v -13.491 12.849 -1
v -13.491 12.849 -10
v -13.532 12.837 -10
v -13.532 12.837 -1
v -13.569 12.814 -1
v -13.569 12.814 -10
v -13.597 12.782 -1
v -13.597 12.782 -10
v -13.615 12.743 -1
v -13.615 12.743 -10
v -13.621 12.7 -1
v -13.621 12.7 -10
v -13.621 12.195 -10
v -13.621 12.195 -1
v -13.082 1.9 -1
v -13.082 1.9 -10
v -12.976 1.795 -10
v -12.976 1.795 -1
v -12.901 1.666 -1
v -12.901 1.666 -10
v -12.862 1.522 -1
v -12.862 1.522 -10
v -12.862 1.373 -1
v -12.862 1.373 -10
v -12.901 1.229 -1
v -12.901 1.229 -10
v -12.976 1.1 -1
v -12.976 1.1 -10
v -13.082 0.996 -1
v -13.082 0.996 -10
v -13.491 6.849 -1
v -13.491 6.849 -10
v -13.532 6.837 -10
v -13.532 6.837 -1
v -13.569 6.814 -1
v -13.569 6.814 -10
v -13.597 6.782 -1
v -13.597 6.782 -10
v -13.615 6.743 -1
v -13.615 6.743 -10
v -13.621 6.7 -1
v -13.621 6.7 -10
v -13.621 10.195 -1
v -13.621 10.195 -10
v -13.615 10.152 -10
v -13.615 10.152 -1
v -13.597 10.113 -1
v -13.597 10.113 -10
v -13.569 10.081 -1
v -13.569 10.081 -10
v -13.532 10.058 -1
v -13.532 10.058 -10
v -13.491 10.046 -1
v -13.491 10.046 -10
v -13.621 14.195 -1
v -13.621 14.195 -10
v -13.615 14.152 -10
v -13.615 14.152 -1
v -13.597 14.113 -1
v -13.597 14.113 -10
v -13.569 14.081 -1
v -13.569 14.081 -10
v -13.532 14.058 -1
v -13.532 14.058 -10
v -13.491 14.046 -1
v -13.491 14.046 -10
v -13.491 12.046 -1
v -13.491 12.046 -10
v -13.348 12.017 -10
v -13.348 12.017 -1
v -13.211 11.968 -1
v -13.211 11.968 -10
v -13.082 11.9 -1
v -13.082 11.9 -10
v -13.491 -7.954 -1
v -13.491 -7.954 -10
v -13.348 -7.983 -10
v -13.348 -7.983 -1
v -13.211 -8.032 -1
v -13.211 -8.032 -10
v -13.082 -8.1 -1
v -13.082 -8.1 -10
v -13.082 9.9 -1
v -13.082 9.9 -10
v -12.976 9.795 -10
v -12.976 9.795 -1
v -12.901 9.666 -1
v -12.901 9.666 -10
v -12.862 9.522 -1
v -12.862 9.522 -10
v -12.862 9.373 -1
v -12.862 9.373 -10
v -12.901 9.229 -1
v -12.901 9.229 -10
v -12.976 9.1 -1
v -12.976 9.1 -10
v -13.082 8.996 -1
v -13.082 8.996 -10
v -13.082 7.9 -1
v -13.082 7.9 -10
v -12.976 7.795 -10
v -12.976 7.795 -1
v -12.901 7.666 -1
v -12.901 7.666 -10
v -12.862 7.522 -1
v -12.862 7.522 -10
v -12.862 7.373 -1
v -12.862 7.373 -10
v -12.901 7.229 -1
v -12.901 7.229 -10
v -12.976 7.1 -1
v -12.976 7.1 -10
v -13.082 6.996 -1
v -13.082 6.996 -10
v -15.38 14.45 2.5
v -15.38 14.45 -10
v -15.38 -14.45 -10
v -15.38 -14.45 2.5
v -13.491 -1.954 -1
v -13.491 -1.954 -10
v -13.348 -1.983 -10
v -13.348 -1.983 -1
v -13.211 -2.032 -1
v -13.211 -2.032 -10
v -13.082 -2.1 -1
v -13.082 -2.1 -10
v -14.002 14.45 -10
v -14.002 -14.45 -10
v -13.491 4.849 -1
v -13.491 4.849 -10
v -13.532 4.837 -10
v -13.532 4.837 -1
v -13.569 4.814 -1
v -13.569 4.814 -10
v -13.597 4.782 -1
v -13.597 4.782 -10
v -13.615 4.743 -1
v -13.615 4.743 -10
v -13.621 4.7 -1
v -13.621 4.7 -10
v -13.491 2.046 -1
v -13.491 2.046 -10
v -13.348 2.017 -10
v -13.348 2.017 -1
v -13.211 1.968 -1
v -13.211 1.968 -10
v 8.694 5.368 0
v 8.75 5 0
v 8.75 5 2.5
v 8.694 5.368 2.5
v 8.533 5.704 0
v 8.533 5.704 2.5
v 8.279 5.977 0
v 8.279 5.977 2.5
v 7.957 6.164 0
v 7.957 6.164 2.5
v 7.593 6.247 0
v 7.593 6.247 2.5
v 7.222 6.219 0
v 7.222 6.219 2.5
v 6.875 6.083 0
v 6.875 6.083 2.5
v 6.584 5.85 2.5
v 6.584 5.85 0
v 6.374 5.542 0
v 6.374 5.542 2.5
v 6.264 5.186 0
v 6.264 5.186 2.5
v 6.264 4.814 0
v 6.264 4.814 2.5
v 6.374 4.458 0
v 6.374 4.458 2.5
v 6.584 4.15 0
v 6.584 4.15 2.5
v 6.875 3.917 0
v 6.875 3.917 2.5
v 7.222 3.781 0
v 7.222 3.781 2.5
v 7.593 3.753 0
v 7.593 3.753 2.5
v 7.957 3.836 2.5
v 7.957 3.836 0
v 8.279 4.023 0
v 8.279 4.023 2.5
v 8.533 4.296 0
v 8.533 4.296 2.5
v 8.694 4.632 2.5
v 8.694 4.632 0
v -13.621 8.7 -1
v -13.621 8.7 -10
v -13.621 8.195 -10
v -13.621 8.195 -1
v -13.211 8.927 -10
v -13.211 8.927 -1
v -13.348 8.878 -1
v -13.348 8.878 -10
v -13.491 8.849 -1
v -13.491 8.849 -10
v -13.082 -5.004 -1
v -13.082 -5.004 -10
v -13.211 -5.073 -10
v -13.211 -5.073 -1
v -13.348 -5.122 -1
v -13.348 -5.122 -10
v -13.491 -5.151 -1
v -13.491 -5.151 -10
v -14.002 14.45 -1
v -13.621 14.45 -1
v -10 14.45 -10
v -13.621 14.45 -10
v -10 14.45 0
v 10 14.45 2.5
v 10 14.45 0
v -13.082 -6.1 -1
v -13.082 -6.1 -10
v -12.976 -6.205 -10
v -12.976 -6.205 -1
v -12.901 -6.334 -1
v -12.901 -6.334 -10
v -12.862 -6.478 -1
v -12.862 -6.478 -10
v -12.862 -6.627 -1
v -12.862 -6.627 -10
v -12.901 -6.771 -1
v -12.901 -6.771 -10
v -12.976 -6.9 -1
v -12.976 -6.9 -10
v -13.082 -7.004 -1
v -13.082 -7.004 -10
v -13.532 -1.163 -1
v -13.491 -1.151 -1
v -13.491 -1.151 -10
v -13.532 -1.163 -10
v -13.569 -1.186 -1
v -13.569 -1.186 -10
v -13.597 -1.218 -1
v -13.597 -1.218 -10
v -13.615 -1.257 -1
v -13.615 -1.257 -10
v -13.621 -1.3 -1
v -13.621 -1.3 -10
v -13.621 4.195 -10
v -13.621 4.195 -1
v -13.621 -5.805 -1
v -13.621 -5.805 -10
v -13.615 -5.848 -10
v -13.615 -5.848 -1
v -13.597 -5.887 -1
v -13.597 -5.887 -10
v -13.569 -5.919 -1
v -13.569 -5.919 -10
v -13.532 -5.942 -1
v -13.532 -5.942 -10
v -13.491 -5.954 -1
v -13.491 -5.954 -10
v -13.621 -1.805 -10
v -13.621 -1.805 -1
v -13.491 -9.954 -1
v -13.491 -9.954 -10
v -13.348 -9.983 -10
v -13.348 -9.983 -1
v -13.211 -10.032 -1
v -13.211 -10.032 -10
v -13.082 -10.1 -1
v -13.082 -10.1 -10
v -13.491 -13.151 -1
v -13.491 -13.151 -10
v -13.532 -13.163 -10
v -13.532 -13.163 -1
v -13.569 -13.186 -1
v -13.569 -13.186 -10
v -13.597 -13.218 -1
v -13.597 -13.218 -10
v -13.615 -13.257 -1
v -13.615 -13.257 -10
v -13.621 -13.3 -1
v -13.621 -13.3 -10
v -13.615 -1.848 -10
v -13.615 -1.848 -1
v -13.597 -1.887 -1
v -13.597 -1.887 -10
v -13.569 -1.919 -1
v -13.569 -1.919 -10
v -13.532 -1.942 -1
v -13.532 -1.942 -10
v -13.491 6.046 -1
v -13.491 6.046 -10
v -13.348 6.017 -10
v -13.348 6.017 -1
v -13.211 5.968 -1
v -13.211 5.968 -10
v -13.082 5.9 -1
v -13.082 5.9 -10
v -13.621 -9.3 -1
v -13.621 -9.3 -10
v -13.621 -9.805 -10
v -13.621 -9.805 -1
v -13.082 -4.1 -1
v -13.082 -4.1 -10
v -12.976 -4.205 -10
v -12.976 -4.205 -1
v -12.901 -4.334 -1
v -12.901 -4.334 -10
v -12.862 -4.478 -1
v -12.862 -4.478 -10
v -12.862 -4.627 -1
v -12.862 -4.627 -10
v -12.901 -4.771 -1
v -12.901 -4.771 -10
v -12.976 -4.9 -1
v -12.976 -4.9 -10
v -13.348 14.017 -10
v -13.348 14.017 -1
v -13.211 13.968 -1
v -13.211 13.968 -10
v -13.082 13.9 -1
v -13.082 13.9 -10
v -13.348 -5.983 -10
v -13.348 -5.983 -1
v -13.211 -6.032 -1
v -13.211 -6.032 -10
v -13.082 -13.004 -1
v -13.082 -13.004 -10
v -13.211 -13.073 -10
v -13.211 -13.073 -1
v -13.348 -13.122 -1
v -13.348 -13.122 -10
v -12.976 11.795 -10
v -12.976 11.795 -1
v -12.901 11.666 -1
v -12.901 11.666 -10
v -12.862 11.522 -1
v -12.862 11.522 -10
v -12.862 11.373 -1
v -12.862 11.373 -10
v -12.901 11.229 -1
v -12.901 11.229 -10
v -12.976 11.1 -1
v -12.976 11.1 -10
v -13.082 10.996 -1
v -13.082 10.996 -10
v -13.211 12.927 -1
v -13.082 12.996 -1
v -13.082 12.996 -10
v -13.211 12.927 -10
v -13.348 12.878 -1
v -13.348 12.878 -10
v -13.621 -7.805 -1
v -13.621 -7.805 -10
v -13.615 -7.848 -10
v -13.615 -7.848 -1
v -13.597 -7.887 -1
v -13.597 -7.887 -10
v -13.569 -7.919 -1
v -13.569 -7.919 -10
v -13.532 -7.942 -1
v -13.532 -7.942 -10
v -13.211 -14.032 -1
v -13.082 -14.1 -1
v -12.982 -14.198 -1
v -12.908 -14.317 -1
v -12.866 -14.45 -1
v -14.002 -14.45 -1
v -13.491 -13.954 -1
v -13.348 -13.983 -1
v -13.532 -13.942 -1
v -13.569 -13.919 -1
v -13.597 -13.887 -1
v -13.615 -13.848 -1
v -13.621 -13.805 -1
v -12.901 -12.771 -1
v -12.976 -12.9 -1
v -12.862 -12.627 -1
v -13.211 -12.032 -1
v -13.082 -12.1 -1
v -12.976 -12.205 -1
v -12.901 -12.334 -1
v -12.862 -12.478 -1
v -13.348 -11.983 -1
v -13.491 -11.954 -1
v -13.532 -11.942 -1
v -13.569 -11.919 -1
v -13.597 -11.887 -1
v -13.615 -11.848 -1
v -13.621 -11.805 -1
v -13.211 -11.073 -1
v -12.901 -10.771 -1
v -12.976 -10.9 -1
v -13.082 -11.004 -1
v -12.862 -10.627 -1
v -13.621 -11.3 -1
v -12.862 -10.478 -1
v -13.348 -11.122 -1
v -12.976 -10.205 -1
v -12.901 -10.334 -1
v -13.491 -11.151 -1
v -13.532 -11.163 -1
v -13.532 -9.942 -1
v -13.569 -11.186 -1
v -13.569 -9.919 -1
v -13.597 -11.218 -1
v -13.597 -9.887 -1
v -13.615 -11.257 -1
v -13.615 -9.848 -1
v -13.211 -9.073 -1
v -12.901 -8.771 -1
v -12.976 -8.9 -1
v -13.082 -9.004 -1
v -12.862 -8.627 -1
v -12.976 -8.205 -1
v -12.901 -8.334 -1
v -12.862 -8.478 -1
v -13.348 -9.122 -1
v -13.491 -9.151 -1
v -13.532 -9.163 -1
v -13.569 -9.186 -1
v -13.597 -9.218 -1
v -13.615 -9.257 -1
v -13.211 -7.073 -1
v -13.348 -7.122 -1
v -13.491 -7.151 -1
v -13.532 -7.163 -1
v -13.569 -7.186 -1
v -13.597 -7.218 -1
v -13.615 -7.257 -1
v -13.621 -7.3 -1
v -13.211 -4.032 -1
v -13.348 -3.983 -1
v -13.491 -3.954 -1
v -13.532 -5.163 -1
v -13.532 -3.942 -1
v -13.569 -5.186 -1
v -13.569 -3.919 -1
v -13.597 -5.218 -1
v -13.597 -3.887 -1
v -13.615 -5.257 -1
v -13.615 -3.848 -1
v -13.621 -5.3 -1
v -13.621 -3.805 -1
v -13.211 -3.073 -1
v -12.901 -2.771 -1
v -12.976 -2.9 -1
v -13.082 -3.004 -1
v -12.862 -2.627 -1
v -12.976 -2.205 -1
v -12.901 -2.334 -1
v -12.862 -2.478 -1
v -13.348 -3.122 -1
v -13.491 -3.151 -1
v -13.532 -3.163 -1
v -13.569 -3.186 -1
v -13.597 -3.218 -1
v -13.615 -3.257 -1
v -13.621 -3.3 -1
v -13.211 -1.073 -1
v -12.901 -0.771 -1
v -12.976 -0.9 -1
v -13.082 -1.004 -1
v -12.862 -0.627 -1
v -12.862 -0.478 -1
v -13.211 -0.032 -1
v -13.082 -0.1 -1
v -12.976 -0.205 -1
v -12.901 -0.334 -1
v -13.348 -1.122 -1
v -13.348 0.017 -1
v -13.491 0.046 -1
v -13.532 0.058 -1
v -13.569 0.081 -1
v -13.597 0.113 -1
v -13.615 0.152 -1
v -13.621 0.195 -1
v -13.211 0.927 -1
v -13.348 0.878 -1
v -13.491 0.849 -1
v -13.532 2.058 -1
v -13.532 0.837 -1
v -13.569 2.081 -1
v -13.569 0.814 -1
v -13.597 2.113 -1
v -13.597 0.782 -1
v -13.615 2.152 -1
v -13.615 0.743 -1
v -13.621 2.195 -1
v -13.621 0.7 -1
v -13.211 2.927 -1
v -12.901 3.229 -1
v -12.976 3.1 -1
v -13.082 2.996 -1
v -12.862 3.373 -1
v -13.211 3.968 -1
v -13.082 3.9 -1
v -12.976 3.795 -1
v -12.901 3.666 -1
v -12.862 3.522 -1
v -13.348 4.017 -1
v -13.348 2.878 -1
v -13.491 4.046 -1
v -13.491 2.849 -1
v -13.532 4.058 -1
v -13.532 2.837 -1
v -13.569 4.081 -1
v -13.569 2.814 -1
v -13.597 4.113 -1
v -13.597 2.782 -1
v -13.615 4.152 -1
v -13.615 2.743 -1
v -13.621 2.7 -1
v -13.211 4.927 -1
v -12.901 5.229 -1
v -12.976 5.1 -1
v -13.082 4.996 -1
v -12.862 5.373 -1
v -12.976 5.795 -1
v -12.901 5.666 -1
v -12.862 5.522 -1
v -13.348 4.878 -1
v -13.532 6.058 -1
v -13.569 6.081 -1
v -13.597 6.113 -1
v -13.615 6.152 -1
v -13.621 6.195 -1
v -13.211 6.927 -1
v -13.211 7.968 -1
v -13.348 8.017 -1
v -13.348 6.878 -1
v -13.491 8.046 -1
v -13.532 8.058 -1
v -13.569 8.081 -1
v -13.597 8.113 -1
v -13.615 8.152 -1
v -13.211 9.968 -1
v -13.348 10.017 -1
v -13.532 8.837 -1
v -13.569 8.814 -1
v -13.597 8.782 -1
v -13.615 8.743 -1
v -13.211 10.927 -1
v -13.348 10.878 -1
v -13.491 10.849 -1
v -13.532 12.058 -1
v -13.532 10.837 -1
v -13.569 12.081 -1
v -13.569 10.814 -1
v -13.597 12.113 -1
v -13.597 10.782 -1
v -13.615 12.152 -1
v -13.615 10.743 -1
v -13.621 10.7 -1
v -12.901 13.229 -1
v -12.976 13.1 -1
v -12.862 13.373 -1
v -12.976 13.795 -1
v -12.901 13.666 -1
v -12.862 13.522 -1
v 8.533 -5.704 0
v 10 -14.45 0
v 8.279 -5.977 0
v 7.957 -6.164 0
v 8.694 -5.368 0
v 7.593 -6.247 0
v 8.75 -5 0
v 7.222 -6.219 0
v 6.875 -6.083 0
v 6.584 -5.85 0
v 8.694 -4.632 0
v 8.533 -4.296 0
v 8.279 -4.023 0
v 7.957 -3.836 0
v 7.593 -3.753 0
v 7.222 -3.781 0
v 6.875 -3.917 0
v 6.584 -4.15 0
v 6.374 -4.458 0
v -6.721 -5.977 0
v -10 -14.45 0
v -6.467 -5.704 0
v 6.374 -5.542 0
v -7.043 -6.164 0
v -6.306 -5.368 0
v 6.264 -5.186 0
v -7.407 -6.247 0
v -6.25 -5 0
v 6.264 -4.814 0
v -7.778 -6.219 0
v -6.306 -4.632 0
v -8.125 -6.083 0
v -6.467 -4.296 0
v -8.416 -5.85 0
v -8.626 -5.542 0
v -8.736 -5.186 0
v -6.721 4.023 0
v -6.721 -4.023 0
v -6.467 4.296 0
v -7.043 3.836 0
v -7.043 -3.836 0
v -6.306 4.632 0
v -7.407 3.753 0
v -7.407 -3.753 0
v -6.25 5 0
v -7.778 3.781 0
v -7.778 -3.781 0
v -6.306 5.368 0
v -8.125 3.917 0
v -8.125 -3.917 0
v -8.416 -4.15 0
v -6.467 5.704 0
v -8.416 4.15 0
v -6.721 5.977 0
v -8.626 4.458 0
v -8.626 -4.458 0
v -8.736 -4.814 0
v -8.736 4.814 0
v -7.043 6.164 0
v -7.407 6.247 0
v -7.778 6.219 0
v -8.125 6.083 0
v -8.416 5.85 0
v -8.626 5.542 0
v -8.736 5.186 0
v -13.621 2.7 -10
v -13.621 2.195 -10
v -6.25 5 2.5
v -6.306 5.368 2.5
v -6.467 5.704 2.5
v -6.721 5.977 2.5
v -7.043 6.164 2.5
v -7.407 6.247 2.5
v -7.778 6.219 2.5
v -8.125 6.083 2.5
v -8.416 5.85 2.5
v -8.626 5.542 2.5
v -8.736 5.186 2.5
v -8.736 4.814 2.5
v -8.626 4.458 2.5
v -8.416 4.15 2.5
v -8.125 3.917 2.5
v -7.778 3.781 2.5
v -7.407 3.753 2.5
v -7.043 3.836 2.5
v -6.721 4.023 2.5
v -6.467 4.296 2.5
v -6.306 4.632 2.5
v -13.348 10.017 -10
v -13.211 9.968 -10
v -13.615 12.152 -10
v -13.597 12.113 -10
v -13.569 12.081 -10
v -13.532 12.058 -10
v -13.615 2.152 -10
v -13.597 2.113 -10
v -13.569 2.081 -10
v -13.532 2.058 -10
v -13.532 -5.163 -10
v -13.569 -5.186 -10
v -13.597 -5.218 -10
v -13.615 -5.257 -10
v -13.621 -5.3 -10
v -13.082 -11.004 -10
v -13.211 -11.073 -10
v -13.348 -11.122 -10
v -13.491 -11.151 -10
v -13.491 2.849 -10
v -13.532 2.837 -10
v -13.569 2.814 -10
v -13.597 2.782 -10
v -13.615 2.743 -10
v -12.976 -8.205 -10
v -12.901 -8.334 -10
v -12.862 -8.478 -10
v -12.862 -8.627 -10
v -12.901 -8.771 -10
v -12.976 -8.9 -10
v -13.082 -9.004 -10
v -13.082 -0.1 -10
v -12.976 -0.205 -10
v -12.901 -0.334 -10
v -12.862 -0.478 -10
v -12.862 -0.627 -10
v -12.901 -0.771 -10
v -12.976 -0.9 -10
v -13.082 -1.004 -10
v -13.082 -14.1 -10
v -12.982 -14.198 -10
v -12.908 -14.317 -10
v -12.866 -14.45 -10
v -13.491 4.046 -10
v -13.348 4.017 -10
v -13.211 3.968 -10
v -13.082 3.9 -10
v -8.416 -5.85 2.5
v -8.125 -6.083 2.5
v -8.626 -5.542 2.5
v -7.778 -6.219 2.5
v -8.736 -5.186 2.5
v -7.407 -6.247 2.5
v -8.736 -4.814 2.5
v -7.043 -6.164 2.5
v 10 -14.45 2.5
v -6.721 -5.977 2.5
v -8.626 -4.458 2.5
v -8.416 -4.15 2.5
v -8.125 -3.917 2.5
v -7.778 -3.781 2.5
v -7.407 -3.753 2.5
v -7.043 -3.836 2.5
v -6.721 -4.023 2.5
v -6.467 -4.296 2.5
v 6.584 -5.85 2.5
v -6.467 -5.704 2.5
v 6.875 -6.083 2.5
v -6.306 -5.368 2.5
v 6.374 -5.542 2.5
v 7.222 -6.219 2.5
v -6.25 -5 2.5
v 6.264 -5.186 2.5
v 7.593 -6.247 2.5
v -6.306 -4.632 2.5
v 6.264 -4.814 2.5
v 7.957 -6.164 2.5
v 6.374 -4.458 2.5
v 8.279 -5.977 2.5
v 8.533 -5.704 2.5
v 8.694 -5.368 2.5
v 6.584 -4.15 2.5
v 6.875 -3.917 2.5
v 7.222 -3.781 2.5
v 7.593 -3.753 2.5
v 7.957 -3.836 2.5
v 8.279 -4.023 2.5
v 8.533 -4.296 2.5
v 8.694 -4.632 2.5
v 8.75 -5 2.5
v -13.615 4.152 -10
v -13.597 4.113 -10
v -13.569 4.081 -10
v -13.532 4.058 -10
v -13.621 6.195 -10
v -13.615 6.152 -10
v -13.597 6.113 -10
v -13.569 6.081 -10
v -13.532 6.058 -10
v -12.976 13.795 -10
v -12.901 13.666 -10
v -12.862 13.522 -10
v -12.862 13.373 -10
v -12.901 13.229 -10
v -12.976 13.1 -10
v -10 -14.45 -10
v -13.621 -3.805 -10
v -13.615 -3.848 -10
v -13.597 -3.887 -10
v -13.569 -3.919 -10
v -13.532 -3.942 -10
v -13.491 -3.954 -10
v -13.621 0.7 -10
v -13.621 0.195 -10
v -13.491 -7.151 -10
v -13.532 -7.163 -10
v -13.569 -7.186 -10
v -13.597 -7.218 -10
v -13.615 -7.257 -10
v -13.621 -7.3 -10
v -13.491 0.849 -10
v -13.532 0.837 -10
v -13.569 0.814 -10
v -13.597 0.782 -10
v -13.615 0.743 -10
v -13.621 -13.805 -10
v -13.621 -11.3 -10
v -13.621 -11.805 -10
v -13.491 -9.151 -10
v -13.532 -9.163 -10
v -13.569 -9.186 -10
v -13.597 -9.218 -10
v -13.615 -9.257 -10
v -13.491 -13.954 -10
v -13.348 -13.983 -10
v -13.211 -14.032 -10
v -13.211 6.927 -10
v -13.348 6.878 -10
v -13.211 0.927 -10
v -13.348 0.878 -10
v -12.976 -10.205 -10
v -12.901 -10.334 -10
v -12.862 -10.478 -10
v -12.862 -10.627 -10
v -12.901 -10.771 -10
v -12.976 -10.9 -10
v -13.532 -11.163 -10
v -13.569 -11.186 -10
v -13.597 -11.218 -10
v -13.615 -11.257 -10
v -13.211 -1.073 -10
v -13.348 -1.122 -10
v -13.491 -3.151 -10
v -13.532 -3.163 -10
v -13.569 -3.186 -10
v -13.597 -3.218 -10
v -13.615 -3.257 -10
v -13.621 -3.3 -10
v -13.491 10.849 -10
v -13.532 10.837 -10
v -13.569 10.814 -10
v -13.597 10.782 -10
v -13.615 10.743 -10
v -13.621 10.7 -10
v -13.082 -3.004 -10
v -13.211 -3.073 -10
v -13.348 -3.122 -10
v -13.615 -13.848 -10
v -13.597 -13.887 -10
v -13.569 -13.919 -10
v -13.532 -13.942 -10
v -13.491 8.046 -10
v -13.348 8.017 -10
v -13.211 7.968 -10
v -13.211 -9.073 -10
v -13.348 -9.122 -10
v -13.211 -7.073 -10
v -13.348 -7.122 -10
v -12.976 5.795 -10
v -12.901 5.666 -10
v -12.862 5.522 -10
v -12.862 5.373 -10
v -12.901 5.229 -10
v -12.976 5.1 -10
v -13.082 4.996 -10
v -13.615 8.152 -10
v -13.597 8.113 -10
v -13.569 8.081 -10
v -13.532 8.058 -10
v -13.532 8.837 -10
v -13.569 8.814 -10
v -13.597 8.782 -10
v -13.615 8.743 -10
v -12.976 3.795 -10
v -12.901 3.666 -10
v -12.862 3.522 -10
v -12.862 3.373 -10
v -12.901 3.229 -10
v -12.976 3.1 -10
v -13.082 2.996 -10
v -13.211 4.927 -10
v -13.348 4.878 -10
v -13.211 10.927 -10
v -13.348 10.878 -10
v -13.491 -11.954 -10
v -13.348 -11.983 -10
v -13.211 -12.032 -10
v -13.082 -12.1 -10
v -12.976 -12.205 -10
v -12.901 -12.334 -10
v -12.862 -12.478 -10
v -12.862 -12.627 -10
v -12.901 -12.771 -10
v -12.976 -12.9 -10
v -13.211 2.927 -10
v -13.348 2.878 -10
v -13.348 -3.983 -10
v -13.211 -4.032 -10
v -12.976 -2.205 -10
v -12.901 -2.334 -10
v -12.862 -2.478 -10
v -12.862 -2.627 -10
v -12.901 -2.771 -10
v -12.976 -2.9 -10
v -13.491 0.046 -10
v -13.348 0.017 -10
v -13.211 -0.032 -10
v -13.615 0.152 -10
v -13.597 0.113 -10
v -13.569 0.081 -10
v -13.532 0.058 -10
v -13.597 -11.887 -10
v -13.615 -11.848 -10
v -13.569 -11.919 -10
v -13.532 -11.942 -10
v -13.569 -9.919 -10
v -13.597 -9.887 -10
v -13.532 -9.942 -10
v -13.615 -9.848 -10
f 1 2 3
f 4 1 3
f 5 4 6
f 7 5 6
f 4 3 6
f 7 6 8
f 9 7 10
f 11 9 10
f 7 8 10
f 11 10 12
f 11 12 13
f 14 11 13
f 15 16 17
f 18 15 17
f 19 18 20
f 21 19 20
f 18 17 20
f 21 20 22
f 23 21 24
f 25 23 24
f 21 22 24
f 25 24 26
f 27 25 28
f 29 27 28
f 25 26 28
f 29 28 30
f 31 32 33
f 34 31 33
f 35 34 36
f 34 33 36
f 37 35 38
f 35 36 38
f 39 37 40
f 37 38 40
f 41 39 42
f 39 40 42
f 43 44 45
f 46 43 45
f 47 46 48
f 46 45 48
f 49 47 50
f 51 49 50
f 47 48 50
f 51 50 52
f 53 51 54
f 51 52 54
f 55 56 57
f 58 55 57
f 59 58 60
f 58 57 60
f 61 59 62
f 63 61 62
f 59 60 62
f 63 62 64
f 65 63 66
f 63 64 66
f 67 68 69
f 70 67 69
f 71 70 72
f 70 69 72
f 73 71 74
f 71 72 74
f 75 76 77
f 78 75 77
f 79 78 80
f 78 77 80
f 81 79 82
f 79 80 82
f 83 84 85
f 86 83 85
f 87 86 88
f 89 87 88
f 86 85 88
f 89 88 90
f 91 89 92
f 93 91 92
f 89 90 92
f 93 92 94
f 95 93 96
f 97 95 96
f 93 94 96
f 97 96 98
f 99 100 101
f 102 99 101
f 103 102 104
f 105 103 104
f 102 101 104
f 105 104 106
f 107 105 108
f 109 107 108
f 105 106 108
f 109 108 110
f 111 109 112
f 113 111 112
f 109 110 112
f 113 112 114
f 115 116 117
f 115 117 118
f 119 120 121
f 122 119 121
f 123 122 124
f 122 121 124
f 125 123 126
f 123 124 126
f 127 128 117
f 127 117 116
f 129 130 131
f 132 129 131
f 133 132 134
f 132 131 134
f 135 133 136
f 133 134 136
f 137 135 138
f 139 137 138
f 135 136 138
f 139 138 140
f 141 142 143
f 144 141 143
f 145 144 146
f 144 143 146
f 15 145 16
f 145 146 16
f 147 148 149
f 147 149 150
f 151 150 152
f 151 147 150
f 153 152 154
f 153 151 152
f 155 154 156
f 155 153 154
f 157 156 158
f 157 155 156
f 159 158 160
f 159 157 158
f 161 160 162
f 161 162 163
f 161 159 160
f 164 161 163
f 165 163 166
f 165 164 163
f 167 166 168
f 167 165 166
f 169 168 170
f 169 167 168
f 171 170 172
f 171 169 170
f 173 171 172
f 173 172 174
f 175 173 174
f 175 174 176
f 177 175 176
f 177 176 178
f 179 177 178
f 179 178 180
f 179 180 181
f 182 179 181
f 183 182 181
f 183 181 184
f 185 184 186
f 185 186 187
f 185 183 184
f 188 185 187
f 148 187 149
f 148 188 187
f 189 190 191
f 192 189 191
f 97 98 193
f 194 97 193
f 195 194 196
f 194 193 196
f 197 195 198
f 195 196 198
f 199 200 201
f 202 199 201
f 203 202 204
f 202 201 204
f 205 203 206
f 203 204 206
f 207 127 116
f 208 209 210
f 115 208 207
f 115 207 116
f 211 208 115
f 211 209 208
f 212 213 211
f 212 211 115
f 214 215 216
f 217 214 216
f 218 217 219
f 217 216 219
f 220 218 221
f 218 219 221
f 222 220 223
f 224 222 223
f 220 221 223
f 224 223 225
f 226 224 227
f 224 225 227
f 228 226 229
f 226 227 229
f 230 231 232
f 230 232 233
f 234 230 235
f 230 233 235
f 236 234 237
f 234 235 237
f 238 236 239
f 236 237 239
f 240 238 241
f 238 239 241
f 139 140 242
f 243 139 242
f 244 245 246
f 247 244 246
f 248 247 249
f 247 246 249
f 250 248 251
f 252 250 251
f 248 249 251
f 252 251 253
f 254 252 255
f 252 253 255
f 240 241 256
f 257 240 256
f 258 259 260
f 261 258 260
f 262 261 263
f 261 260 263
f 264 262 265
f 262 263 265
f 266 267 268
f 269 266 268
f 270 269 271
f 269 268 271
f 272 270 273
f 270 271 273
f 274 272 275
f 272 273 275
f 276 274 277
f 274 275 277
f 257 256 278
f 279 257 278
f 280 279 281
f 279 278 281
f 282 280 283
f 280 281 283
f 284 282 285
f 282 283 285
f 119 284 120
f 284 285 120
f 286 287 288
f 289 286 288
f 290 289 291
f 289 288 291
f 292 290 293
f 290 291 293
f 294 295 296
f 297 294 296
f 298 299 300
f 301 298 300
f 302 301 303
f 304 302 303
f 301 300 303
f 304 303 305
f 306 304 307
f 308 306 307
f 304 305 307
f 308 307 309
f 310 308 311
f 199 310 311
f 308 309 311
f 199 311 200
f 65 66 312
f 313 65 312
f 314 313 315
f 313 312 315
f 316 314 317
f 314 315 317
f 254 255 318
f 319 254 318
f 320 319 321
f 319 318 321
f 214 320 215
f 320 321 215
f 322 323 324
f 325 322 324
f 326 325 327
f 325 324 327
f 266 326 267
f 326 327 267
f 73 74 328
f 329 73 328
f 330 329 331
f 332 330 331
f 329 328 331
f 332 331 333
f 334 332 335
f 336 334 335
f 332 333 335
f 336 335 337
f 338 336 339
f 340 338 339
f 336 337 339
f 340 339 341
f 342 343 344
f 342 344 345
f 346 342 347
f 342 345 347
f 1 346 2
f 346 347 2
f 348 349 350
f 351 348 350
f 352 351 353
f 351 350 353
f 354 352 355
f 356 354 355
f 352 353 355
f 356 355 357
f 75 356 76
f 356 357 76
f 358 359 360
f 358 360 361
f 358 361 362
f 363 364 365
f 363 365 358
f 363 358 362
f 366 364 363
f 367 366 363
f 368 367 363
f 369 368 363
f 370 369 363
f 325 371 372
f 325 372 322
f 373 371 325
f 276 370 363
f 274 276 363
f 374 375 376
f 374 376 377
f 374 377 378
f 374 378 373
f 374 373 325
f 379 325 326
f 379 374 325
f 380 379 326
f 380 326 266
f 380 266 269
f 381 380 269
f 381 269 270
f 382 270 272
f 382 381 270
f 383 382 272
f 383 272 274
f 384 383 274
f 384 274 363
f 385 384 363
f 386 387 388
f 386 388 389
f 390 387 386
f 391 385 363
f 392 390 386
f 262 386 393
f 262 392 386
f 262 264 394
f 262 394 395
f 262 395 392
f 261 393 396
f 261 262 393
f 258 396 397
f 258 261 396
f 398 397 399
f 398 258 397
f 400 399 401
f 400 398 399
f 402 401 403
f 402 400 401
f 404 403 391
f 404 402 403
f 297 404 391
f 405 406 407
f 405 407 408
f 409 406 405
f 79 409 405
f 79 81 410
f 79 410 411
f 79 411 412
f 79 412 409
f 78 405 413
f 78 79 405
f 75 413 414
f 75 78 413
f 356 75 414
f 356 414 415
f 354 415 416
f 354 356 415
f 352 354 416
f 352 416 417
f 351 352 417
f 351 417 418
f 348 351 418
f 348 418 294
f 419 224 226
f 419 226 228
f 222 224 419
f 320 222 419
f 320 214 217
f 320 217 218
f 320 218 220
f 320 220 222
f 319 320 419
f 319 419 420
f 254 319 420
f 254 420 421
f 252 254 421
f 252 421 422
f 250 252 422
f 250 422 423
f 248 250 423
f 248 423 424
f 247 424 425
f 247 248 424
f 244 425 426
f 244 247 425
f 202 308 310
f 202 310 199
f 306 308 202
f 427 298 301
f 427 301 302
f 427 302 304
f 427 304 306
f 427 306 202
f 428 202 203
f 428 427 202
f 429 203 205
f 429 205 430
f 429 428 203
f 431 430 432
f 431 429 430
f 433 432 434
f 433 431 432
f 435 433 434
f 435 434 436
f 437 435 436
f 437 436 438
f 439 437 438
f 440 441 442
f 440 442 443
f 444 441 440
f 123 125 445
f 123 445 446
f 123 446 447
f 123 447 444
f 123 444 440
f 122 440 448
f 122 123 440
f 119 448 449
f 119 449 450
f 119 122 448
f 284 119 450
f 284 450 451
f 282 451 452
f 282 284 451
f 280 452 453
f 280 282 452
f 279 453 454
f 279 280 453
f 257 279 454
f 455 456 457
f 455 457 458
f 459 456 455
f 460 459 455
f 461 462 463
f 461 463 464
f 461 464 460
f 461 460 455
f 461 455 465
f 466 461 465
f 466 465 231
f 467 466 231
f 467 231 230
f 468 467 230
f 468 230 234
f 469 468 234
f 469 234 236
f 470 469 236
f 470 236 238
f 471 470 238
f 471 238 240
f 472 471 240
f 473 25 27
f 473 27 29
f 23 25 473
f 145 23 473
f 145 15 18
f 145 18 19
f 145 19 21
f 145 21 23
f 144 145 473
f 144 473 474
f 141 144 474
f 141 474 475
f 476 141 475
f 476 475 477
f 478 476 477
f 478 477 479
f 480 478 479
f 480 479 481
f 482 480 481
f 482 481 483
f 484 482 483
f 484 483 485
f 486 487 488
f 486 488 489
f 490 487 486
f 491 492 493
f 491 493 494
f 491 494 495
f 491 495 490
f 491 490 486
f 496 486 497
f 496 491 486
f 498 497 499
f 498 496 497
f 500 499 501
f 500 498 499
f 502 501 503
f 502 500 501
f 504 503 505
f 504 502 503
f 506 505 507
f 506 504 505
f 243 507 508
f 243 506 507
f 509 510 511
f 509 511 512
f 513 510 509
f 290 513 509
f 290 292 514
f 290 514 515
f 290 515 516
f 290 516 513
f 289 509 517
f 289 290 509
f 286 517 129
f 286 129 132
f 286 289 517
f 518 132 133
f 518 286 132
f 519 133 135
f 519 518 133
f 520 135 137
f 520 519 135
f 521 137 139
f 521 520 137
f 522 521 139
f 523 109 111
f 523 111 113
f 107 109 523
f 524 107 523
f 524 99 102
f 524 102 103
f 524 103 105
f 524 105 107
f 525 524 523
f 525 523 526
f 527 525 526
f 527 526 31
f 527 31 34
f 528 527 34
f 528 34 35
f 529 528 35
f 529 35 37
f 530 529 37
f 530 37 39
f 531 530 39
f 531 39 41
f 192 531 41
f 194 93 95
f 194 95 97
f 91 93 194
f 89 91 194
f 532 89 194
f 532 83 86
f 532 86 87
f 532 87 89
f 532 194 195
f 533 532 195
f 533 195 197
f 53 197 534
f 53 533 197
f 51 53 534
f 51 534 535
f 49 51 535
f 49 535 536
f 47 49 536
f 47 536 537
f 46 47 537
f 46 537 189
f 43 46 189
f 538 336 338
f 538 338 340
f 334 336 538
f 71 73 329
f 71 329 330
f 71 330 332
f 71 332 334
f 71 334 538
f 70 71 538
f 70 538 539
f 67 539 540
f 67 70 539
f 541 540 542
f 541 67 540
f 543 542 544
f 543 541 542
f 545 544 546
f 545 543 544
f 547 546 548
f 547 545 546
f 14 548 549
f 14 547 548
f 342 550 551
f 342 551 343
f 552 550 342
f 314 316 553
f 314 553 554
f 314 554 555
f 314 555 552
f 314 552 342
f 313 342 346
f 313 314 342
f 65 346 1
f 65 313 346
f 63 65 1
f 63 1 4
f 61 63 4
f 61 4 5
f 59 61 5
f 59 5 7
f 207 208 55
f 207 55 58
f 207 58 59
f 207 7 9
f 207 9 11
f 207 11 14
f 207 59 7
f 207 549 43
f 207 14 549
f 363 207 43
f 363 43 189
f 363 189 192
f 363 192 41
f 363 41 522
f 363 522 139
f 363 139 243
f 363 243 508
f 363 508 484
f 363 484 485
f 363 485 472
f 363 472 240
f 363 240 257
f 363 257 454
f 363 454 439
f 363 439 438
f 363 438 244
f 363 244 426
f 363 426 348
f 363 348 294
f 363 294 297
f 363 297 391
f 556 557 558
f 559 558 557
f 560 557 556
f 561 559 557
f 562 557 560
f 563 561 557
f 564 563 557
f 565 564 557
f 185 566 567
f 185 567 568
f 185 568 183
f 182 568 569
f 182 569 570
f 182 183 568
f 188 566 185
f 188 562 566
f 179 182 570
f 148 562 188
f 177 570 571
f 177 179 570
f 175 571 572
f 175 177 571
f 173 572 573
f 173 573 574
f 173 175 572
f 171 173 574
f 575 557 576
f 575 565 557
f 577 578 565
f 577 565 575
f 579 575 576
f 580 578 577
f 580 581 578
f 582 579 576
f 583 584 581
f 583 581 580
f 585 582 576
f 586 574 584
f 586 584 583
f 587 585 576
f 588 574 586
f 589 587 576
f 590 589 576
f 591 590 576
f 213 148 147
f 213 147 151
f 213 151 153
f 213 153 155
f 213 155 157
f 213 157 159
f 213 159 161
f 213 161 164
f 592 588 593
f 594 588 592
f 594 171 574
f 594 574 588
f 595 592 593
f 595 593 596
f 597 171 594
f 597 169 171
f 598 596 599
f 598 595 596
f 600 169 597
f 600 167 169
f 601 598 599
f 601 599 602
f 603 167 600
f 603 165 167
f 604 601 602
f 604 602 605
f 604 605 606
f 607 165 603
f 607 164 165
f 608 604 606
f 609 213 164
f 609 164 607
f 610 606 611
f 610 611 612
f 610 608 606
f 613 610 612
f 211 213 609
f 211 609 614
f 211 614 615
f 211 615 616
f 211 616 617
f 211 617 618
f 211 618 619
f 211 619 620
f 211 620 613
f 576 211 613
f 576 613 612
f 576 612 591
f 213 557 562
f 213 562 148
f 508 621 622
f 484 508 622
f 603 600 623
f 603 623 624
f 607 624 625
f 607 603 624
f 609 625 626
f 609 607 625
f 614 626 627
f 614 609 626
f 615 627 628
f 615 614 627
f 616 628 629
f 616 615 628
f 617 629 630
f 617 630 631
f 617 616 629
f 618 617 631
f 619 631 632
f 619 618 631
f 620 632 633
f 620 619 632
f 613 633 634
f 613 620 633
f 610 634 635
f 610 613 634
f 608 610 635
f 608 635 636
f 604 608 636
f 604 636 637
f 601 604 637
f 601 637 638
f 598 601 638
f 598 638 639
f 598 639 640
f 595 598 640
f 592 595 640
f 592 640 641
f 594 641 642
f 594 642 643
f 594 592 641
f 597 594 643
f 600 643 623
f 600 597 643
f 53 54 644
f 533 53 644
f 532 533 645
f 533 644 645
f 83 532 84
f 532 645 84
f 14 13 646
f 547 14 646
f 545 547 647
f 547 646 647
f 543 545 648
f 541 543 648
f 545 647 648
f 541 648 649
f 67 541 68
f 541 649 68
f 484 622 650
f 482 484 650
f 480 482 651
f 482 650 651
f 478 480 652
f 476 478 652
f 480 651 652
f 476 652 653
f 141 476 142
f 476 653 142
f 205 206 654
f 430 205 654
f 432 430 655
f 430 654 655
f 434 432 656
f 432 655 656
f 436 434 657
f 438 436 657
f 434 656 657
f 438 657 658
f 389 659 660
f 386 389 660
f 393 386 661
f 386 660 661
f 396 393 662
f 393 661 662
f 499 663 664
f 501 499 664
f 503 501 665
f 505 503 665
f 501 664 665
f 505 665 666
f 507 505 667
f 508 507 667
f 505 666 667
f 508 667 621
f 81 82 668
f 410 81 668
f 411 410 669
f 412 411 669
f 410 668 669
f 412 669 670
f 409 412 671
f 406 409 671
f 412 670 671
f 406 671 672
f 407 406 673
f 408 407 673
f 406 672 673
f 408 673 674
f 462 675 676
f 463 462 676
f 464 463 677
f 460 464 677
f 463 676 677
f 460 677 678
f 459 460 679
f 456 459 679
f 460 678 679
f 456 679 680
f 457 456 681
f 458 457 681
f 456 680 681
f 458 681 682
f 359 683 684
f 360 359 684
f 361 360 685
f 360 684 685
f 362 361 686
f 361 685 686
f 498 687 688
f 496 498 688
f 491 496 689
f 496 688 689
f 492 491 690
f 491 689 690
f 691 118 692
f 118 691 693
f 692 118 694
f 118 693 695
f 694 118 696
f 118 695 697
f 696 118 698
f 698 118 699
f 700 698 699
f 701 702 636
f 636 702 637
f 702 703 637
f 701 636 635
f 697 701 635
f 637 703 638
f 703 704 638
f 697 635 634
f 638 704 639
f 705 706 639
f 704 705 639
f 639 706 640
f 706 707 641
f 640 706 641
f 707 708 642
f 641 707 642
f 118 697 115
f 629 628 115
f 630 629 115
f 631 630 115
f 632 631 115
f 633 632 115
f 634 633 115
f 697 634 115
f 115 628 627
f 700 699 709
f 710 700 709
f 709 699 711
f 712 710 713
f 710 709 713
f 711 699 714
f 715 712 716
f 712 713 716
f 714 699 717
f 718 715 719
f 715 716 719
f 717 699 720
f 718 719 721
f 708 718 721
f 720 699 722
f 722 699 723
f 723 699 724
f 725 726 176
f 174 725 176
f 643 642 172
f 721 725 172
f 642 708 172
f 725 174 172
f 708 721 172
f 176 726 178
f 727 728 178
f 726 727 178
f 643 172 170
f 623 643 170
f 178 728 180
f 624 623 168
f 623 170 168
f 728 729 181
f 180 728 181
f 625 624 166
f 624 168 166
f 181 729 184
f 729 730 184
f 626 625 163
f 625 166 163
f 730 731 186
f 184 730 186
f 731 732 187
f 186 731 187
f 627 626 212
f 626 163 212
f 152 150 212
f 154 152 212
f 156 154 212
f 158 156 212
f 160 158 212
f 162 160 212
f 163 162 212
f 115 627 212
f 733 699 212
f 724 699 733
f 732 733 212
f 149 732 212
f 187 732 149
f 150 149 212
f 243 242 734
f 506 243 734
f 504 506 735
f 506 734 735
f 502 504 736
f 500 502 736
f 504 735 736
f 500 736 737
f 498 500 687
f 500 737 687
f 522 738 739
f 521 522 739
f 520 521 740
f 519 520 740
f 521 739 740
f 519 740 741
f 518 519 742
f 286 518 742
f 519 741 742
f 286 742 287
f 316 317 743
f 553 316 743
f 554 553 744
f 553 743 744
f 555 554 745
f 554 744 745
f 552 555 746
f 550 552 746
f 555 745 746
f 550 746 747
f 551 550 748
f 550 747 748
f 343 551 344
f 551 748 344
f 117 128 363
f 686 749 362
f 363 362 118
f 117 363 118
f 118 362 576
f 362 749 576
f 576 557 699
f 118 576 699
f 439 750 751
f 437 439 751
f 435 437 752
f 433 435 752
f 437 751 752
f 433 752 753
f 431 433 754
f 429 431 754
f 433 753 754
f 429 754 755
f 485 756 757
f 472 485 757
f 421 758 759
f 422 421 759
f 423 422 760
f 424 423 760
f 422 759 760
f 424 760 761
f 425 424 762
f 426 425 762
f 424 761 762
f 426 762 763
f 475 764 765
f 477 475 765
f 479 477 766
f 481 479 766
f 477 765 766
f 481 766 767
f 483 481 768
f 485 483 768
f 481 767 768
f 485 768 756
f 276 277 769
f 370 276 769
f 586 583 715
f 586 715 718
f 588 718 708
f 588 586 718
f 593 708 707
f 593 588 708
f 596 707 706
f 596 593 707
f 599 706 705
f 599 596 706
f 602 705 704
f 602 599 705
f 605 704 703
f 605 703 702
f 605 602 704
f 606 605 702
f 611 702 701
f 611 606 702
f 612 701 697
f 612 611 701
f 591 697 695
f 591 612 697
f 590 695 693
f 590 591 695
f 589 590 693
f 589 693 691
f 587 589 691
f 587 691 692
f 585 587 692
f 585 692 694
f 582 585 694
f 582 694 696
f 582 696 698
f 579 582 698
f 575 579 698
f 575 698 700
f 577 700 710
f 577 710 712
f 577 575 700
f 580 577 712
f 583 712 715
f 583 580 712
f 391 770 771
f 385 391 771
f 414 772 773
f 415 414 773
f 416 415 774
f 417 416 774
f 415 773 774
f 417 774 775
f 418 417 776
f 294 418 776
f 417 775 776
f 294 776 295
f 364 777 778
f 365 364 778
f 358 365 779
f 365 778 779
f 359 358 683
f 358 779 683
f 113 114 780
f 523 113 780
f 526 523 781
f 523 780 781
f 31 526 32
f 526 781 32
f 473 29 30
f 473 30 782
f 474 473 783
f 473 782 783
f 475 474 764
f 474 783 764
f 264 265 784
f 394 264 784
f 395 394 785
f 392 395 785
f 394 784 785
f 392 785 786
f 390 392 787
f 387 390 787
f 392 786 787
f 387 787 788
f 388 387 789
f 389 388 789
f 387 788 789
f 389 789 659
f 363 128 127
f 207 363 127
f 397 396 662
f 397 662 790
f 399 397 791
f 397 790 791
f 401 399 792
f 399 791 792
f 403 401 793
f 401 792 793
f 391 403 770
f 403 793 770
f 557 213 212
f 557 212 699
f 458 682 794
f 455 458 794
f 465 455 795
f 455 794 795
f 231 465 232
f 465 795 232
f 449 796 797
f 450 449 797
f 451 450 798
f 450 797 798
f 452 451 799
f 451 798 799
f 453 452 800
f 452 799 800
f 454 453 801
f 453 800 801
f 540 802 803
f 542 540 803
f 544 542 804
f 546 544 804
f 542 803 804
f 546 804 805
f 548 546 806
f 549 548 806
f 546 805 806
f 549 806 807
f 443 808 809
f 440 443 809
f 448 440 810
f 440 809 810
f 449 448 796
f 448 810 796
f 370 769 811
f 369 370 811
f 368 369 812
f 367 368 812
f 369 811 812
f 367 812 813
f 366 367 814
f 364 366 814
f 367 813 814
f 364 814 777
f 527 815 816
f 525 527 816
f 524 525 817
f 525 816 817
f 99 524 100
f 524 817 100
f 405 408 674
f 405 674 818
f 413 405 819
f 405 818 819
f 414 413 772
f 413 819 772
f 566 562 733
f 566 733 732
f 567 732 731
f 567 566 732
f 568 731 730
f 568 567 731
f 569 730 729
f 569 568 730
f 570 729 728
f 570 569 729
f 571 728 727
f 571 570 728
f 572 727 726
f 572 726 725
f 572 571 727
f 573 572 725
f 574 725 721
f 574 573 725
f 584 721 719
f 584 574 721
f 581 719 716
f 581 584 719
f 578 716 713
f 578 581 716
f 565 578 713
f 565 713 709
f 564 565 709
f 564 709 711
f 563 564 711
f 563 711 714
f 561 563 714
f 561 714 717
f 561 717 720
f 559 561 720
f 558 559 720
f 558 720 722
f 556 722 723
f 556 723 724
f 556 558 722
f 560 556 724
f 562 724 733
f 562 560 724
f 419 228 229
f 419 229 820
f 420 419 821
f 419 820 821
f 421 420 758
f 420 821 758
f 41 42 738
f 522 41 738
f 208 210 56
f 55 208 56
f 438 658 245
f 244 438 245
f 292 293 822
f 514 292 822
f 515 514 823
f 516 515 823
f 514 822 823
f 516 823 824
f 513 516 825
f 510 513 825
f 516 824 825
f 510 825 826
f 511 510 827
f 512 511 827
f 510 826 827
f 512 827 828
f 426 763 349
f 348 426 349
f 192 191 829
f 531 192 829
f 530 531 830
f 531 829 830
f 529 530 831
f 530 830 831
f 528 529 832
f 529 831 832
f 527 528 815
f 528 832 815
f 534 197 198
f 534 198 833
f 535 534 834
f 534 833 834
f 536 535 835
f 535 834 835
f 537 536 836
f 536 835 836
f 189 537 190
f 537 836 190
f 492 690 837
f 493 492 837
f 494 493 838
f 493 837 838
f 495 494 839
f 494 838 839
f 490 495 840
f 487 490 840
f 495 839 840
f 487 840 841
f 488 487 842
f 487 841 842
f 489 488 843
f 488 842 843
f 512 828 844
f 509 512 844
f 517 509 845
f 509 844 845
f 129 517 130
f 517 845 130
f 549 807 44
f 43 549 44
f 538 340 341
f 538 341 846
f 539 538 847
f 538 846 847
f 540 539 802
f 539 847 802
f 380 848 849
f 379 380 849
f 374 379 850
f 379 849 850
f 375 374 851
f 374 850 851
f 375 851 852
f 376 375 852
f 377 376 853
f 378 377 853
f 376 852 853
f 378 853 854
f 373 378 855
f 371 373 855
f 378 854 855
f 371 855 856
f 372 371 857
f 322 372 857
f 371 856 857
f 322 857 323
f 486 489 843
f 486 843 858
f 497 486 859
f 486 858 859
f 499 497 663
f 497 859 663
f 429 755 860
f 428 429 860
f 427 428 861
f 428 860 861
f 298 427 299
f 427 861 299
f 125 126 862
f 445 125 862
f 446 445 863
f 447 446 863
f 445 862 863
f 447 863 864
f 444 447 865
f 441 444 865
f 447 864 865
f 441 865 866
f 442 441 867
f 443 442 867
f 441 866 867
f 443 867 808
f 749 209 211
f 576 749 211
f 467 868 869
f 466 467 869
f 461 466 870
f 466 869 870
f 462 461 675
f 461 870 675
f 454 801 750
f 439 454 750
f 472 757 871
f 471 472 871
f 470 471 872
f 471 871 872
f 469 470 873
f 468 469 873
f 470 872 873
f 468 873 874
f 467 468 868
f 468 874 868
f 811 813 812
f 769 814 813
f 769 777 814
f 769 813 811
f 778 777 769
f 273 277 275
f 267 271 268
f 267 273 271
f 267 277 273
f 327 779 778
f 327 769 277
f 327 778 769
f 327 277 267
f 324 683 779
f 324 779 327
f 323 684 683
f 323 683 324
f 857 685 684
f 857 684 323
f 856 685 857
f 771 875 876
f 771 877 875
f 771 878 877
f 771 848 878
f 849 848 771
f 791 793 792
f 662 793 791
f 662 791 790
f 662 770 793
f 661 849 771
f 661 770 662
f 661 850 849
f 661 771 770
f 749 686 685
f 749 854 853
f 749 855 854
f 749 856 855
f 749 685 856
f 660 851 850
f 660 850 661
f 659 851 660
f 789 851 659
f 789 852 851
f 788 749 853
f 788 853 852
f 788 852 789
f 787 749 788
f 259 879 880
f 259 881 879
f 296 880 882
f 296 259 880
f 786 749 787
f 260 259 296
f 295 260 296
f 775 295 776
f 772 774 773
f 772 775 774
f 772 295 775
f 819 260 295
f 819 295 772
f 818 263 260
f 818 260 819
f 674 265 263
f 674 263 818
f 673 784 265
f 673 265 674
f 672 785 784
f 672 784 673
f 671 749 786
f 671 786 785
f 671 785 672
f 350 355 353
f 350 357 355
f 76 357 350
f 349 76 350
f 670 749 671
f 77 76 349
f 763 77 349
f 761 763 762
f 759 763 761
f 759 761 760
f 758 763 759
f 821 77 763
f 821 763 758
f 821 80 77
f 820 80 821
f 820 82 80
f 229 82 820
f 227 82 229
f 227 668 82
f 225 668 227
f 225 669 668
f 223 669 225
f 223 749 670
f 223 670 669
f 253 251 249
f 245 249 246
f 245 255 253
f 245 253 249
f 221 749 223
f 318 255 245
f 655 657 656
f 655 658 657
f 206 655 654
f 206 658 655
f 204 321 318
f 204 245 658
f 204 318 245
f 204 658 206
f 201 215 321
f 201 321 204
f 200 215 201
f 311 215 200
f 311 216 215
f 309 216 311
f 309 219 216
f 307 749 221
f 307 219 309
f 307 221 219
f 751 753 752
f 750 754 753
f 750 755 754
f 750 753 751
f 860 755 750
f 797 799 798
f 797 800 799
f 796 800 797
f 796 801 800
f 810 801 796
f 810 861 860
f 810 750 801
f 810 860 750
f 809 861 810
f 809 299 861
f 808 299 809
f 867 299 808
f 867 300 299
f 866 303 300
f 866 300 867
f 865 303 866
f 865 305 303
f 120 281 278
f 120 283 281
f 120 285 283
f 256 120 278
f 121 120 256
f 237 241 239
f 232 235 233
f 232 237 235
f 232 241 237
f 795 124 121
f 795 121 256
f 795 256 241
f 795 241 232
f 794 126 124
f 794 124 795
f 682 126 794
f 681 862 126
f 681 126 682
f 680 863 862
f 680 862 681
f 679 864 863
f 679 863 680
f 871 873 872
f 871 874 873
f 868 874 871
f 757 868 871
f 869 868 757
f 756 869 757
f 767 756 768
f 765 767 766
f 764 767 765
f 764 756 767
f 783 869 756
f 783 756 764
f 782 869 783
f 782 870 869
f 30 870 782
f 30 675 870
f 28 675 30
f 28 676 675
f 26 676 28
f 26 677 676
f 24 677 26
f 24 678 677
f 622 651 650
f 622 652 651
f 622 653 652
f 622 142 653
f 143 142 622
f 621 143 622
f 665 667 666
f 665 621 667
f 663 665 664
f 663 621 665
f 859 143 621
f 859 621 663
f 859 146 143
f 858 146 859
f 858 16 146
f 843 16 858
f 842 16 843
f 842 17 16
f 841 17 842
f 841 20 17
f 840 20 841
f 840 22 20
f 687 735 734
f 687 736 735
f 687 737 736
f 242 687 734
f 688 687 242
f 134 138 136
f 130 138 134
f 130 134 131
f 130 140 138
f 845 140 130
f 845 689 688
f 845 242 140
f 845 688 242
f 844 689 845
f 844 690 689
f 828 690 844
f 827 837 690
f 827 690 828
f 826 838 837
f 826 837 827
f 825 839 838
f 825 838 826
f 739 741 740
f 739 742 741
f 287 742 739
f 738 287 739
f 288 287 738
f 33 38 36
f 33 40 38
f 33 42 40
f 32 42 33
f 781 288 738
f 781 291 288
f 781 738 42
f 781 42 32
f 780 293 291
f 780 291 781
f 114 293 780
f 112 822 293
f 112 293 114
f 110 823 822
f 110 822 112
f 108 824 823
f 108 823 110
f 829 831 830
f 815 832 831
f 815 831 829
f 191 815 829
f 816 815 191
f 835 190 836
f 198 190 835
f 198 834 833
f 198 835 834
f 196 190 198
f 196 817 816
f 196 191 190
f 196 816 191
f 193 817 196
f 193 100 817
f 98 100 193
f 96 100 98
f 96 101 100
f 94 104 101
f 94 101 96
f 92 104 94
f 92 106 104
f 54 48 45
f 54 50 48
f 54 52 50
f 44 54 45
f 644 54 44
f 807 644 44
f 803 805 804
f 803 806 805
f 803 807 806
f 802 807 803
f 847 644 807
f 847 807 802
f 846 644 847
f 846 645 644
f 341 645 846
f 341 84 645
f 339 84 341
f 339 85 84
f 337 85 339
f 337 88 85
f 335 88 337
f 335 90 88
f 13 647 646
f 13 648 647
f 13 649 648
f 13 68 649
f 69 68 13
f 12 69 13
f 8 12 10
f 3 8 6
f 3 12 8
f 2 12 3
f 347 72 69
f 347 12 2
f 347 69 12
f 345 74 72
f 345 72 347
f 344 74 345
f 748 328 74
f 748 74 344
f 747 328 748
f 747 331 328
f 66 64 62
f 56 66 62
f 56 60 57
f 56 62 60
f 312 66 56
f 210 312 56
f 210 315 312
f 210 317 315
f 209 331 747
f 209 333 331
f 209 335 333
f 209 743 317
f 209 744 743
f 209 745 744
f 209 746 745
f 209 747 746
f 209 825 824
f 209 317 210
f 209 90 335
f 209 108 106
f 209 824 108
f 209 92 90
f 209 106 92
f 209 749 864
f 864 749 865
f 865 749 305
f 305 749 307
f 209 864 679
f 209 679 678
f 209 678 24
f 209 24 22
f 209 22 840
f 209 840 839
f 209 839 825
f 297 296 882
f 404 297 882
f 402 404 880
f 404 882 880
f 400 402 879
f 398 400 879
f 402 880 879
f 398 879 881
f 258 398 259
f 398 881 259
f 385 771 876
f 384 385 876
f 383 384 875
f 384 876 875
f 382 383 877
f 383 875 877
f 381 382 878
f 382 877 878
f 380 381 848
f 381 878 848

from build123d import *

# Parameters (mm, degrees)
SKETCH1_R            = 1.25
BOSS_EXTRUDE1_DEPTH  = 2.5
SKETCH3_W            = 12.5
SKETCH3_H            = 28.9
BOSS_EXTRUDE2_DEPTH  = 5.38
CUT_EXTRUDE1_DEPTH   = 9
LPATTERN1_COUNT      = 4
LPATTERN1_PITCH      = 10
LPATTERN1_COUNT_DIR2 = 2
LPATTERN1_PITCH_DIR2 = 10


with BuildPart() as part:
    # Sketch1 → Boss-Extrude1 (new body)
    with BuildSketch(Plane.XY):
        Polygon((9.79, -14.45), (-8.795857864, -14.45), (-10, -14.45), (-10, 14.45), (-9.79, 14.45), (8.795857864, 14.45), (10, 14.45), (10, -14.45), align=None)
        with Locations((-7.5, -5)):
            Circle(SKETCH1_R, mode=Mode.SUBTRACT)
        with Locations((-7.5, 5)):
            Circle(SKETCH1_R, mode=Mode.SUBTRACT)
        with Locations((7.5, 5)):
            Circle(SKETCH1_R, mode=Mode.SUBTRACT)
        with Locations((7.5, -5)):
            Circle(SKETCH1_R, mode=Mode.SUBTRACT)
    extrude(amount=BOSS_EXTRUDE1_DEPTH)

    # Sketch3 → Boss-Extrude2 (add)
    with BuildSketch(Plane.ZY.offset(10)):
        with Locations((-3.75, 0)):
            Rectangle(SKETCH3_W, SKETCH3_H)
    extrude(amount=BOSS_EXTRUDE2_DEPTH)

    # Sketch4 → Cut-Extrude1 (cut)
    with BuildSketch(Plane(origin=(0, 0, -10), x_dir=(-1, 0, 0), z_dir=(0, 0, -1))):
        with BuildLine():
            Line((13.62129958, 14.447528029), (13.62129958, 14.194772629))
            ThreePointArc((13.62129958, 14.194772629), (13.584011291, 14.095850288), (13.49070263, 14.046155824))
            ThreePointArc((13.49070263, 14.046155824), (13.278327951, 13.994947975), (13.081809662, 13.899523608))
            ThreePointArc((13.081809662, 13.899523608), (12.85675958, 13.447530026), (13.081809666, 12.995536447))
            ThreePointArc((13.081809666, 12.995536447), (13.278327608, 12.9001091), (13.490702635, 12.848898474))
            ThreePointArc((13.490702635, 12.848898474), (13.584017776, 12.799196632), (13.62129958, 12.700262029))
            Line((13.62129958, 12.700262029), (13.62129958, 12.194776629))
            ThreePointArc((13.62129958, 12.194776629), (13.584011291, 12.095854288), (13.49070263, 12.046159824))
            ThreePointArc((13.49070263, 12.046159824), (13.278327951, 11.994951975), (13.081809662, 11.899527608))
            ThreePointArc((13.081809662, 11.899527608), (12.85675958, 11.447534026), (13.081809666, 10.995540447))
            ThreePointArc((13.081809666, 10.995540447), (13.278327608, 10.9001131), (13.490702635, 10.848902474))
            ThreePointArc((13.490702635, 10.848902474), (13.584017776, 10.799200632), (13.62129958, 10.700266029))
            Line((13.62129958, 10.700266029), (13.62129958, 10.194780629))
            ThreePointArc((13.62129958, 10.194780629), (13.584011291, 10.095858288), (13.49070263, 10.046163824))
            ThreePointArc((13.49070263, 10.046163824), (13.278326417, 9.994943722), (13.081809662, 9.899506208))
            ThreePointArc((13.081809662, 9.899506208), (12.85675958, 9.447512626), (13.081809666, 8.995519047))
            ThreePointArc((13.081809666, 8.995519047), (13.278327608, 8.9000917), (13.490702635, 8.848881074))
            ThreePointArc((13.490702635, 8.848881074), (13.584009392, 8.799188772), (13.62129958, 8.700270029))
            Line((13.62129958, 8.700270029), (13.62129958, 8.194759229))
            ThreePointArc((13.62129958, 8.194759229), (13.584011291, 8.095836888), (13.49070263, 8.046142424))
            ThreePointArc((13.49070263, 8.046142424), (13.278327951, 7.994934575), (13.081809662, 7.899510208))
            ThreePointArc((13.081809662, 7.899510208), (12.85675958, 7.447516626), (13.081809666, 6.995523047))
            ThreePointArc((13.081809666, 6.995523047), (13.278327608, 6.9000957), (13.490702635, 6.848885074))
            ThreePointArc((13.490702635, 6.848885074), (13.584009392, 6.799192772), (13.62129958, 6.700274029))
            Line((13.62129958, 6.700274029), (13.62129958, 6.194763229))
            ThreePointArc((13.62129958, 6.194763229), (13.584011291, 6.095840888), (13.49070263, 6.046146424))
            ThreePointArc((13.49070263, 6.046146424), (13.278327951, 5.994938575), (13.081809662, 5.899514208))
            ThreePointArc((13.081809662, 5.899514208), (12.85675958, 5.447520626), (13.081809666, 4.995527047))
            ThreePointArc((13.081809666, 4.995527047), (13.278327608, 4.9000997), (13.490702635, 4.848889074))
            ThreePointArc((13.490702635, 4.848889074), (13.584009392, 4.799196772), (13.62129958, 4.700278029))
            Line((13.62129958, 4.700278029), (13.62129958, 4.447522629))
            Line((13.62129958, 4.447522629), (14.00229958, 4.447522629))
            Line((14.00229958, 4.447522629), (14.00229958, 14.447528029))
            Line((14.00229958, 14.447528029), (13.62129958, 14.447528029))
        make_face()
    cut_extrude1 = extrude(amount=-CUT_EXTRUDE1_DEPTH, mode=Mode.SUBTRACT)

    # LPattern1: Cut-Extrude1 4 × 2
    with Locations(*[Vector(0, -1, 0) * (i * LPATTERN1_PITCH) + Vector(0, 1, 0) * (j * LPATTERN1_PITCH_DIR2) for i in range(LPATTERN1_COUNT) for j in range(LPATTERN1_COUNT_DIR2) if (i, j) != (0, 0)]):
        add(cut_extrude1, mode=Mode.SUBTRACT)


solid = part.part
